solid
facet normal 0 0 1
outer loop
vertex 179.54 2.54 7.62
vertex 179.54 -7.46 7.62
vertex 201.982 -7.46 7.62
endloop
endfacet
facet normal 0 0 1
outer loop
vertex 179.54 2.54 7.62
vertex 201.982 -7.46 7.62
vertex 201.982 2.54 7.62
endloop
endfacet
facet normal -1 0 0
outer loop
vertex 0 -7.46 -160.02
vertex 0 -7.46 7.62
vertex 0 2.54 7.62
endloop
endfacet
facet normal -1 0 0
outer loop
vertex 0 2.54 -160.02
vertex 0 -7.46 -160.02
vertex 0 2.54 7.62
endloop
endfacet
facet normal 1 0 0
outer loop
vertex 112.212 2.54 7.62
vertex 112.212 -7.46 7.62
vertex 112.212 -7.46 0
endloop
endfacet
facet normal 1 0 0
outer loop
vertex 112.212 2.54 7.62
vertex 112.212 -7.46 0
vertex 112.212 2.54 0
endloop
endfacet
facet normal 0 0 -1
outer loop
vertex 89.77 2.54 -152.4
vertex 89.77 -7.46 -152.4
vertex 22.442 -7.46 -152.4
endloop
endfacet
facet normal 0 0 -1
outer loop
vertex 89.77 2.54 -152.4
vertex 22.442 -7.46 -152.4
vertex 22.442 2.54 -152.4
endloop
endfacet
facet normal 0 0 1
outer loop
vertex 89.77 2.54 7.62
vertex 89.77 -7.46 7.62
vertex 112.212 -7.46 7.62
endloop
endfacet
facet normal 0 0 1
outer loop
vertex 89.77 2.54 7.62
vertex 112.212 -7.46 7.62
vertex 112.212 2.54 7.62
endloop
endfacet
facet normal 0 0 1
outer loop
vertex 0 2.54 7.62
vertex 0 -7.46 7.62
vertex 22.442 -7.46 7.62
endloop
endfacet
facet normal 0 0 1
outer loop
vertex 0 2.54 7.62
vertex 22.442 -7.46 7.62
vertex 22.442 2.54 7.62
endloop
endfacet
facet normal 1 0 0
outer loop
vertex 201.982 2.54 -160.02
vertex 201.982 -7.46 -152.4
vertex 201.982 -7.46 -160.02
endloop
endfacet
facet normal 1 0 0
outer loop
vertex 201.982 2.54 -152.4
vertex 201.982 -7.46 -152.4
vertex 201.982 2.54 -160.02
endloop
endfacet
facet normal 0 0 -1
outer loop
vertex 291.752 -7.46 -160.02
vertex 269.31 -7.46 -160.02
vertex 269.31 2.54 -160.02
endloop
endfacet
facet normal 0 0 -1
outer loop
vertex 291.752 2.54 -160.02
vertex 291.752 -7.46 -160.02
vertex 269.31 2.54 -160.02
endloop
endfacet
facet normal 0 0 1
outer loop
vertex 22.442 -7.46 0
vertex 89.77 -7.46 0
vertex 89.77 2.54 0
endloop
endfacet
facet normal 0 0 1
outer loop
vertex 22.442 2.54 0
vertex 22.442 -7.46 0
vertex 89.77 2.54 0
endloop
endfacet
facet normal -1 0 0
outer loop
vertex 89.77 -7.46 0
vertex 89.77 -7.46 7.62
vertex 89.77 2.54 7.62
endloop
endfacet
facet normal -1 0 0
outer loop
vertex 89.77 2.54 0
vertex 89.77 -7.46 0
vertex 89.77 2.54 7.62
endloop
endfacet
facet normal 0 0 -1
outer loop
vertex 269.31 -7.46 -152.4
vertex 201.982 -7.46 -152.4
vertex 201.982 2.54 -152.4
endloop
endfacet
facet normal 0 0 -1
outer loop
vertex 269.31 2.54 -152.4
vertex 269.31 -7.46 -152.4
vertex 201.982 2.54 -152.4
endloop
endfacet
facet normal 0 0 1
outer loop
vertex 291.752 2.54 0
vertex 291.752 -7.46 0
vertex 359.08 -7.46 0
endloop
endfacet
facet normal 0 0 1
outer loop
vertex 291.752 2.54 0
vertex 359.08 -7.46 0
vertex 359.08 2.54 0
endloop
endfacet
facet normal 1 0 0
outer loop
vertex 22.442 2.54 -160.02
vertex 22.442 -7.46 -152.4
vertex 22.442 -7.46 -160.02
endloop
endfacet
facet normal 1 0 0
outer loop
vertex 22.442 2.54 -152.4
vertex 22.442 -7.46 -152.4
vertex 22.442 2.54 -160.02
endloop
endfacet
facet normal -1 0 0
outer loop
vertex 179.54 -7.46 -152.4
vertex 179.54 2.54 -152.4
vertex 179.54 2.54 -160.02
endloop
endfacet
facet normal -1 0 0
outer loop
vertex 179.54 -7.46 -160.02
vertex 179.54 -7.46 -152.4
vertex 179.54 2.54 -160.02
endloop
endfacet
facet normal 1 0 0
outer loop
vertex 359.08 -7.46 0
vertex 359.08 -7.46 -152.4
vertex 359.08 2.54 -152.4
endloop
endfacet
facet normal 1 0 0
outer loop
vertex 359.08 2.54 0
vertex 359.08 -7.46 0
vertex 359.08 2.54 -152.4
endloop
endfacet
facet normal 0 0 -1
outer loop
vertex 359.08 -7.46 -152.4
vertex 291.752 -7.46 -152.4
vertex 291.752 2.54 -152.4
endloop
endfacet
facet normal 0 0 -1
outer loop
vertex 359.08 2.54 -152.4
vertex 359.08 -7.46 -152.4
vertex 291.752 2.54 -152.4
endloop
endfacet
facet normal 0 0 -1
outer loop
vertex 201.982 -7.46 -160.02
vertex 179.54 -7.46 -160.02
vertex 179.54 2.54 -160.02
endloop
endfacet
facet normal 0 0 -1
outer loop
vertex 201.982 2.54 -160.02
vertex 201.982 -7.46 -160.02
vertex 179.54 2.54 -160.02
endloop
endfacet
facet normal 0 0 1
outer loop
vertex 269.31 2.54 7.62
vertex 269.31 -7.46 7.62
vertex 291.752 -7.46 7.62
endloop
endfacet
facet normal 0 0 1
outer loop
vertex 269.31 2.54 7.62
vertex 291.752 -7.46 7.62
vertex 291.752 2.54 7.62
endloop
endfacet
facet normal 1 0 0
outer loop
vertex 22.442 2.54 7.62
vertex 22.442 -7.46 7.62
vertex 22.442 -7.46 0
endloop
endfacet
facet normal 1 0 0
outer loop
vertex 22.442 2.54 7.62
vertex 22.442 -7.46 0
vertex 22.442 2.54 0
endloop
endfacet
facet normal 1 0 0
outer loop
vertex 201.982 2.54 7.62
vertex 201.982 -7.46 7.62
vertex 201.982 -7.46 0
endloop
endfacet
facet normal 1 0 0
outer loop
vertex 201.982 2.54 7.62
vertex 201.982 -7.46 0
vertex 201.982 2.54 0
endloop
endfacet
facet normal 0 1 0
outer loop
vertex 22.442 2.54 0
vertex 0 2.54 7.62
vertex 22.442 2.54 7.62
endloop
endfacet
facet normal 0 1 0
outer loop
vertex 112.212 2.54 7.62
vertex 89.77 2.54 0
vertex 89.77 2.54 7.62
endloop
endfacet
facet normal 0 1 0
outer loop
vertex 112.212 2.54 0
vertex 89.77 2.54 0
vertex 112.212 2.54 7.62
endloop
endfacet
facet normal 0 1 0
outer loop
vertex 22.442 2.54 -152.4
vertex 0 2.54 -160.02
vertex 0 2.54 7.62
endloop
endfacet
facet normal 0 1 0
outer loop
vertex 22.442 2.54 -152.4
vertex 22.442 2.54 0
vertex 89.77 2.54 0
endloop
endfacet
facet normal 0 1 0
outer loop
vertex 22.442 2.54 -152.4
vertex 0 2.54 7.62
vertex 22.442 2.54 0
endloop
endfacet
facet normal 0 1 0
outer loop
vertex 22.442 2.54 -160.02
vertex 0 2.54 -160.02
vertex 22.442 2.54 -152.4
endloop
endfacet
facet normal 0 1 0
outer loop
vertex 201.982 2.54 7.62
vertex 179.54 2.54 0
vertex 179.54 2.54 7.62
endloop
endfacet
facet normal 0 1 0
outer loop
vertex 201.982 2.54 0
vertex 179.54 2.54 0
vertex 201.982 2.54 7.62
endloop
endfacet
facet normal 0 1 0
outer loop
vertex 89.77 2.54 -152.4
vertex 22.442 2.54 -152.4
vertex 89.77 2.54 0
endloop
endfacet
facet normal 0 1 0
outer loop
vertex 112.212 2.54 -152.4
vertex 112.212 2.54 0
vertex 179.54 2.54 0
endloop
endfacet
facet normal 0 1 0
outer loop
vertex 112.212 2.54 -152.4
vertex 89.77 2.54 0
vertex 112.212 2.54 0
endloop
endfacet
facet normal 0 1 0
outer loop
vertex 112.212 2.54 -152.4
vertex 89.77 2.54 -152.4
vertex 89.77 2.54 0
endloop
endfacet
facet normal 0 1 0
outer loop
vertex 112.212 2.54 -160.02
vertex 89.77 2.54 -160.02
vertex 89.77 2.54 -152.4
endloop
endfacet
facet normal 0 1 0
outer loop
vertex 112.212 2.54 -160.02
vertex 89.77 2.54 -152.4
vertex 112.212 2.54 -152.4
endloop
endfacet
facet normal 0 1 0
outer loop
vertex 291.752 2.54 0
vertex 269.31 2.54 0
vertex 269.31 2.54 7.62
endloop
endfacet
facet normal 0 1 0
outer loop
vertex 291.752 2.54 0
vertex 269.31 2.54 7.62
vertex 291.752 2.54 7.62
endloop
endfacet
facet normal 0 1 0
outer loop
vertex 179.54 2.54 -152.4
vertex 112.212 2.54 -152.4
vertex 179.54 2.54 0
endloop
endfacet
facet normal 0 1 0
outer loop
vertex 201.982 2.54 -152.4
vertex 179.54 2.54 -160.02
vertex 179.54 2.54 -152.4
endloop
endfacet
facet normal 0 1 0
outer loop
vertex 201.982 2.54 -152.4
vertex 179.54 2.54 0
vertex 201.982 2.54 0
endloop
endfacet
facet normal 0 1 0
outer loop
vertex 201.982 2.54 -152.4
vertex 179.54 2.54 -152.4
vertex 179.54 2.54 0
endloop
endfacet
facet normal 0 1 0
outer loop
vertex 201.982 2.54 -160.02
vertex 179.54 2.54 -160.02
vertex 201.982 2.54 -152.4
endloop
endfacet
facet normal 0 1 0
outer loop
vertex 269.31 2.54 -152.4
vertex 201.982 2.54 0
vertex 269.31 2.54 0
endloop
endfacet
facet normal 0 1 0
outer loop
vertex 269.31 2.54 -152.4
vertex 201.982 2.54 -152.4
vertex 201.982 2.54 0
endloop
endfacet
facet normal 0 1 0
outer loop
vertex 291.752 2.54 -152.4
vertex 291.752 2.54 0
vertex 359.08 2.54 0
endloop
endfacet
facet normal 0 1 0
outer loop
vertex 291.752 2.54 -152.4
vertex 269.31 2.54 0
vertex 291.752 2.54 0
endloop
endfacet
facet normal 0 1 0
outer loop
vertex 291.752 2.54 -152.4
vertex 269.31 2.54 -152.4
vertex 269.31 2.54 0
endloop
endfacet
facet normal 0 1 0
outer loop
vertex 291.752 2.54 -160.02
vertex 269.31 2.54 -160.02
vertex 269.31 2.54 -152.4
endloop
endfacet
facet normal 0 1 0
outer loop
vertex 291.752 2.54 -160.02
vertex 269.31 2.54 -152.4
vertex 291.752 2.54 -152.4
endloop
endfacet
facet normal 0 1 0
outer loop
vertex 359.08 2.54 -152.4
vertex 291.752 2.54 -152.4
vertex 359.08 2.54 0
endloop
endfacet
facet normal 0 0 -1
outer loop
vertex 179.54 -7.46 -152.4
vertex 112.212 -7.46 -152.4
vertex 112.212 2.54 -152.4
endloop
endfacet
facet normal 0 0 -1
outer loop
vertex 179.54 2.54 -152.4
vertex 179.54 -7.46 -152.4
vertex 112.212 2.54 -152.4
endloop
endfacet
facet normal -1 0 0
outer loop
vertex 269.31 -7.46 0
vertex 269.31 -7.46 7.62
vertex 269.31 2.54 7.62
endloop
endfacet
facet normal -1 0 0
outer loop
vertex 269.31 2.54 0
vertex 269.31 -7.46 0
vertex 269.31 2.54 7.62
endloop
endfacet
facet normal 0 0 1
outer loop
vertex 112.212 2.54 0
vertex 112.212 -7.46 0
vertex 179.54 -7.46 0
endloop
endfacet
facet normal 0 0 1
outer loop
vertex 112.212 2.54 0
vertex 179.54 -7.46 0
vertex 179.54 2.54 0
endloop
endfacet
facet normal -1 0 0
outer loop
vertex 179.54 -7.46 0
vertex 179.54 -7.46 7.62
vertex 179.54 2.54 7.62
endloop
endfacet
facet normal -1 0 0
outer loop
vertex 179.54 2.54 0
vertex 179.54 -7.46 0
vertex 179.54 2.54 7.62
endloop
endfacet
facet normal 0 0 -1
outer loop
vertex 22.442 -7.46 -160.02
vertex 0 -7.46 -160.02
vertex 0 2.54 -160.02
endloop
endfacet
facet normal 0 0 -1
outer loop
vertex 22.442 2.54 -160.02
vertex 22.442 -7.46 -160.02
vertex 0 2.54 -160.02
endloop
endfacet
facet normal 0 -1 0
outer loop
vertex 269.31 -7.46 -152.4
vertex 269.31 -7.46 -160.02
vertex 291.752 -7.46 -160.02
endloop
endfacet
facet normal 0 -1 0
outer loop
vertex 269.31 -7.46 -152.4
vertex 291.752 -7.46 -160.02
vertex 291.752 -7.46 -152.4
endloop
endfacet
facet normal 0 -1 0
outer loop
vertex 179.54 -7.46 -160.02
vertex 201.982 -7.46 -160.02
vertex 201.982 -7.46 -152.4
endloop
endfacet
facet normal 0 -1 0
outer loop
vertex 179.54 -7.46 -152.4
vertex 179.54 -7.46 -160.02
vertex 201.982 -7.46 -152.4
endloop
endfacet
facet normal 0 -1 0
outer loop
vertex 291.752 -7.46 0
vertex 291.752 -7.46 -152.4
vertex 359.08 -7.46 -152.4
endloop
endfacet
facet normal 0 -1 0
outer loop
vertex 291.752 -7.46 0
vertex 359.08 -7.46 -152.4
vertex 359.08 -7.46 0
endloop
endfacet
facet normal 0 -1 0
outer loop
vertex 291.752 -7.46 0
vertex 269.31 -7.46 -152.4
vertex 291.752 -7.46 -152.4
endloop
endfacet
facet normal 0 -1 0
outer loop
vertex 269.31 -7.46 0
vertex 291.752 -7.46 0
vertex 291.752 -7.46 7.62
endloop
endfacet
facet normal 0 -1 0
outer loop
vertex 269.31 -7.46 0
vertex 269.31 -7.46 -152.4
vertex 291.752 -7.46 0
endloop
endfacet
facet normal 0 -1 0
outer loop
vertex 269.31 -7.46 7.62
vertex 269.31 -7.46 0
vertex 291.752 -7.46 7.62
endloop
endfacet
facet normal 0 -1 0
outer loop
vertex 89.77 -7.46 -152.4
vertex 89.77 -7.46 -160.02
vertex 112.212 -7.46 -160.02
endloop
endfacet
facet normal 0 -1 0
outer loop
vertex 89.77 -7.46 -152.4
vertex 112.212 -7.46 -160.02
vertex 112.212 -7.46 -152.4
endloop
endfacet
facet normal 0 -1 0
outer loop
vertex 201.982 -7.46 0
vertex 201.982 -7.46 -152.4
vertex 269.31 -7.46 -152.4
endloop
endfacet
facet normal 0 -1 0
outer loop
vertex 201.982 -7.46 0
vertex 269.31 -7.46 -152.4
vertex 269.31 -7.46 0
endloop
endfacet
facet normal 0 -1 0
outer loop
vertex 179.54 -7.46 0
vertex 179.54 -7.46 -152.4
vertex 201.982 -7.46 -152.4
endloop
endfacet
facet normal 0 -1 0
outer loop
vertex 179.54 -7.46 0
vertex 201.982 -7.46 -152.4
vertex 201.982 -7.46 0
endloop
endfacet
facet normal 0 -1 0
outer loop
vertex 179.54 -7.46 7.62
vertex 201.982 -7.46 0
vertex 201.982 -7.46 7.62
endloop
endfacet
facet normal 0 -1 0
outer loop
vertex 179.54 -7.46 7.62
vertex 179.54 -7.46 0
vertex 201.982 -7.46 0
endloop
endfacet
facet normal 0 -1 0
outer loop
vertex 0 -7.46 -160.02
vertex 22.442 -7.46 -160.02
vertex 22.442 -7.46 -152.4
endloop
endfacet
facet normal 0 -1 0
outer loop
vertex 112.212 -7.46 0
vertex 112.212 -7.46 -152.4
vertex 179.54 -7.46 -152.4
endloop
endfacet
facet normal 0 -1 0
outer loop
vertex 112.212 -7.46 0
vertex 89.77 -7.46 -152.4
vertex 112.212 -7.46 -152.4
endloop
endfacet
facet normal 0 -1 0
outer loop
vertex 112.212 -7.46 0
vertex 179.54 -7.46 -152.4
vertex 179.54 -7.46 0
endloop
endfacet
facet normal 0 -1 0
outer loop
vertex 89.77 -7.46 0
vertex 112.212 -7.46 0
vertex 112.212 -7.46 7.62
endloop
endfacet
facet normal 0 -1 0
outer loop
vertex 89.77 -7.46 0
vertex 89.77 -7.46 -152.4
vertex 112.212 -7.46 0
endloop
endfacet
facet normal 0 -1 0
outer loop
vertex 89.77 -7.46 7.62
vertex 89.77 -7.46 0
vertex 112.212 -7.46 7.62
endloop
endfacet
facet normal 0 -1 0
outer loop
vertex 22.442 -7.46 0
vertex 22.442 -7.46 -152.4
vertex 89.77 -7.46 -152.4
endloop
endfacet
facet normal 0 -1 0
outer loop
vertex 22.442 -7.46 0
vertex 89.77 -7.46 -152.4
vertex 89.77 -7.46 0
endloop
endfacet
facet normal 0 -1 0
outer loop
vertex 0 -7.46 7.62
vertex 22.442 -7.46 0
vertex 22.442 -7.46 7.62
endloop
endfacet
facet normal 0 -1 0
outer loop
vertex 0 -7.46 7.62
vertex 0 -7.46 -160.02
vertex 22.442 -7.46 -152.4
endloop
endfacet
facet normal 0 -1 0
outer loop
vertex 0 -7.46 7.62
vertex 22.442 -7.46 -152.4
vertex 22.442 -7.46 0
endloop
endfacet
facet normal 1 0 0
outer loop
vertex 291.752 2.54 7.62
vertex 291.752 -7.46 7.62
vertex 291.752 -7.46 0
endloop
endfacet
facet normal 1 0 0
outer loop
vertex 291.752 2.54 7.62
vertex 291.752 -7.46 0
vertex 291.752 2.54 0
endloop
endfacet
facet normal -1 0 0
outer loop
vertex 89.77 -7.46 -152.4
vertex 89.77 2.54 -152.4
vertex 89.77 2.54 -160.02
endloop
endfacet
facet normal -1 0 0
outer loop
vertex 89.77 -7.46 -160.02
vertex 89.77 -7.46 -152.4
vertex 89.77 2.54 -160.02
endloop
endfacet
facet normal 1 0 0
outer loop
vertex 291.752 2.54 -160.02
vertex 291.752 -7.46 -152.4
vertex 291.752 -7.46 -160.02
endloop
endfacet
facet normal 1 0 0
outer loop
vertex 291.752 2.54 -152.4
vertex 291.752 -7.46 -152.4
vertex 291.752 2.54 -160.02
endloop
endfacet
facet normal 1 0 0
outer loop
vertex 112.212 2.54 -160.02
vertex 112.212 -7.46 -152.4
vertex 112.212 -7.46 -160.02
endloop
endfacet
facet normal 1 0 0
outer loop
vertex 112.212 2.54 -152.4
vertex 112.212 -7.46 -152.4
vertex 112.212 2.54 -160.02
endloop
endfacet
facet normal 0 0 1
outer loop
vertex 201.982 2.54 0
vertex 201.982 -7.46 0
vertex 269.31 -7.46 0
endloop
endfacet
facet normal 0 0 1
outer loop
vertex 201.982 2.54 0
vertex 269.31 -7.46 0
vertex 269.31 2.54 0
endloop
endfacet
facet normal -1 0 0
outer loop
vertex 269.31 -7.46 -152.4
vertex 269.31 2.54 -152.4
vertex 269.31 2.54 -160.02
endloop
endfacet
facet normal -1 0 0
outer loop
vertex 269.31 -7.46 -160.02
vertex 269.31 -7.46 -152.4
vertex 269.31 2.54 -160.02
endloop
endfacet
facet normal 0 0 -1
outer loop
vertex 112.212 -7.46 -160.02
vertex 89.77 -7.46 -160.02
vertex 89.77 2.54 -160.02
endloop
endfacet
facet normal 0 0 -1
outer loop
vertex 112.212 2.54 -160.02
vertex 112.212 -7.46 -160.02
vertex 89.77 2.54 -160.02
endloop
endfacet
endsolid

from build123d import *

# Parameters (mm, degrees)
SKETCH1_W                  = 359.0798
SKETCH1_H                  = 152.4
BOSS_EXTRUDE1_DEPTH        = 2.54
SKETCH2_W                  = 22.4424875
SKETCH2_H                  = 7.62
BOSS_EXTRUDE2_DEPTH        = 2.54
CONVERT_SOLID1_OUTLINE_W   = 7.46
CONVERT_SOLID1_OUTLINE_H   = 152.4
CONVERT_SOLID1_DEPTH       = 359.0798
CONVERT_SOLID1_2_OUTLINE_W = 7.46
CONVERT_SOLID1_2_OUTLINE_H = 7.62
CONVERT_SOLID1_2_DEPTH     = 22.4424875
CONVERT_SOLID1_START       = 89.76995
CONVERT_SOLID1_3_OUTLINE_W = 7.46
CONVERT_SOLID1_3_OUTLINE_H = 7.62
CONVERT_SOLID1_3_DEPTH     = 22.4424875
CONVERT_SOLID1_START_2     = 179.5399
CONVERT_SOLID1_4_OUTLINE_W = 7.46
CONVERT_SOLID1_4_OUTLINE_H = 7.62
CONVERT_SOLID1_4_DEPTH     = 22.4424875
CONVERT_SOLID1_START_3     = 269.30985
CONVERT_SOLID1_5_OUTLINE_W = 7.46
CONVERT_SOLID1_5_OUTLINE_H = 7.62
CONVERT_SOLID1_5_DEPTH     = 22.4424875


# Read off the part's stored shape, not the designer's step: Convert-Solid1
with BuildPart() as part:
    # Sketch1 → Boss-Extrude1 (new body)
    with BuildSketch(Plane(origin=(0, 0, 0), x_dir=(1, 0, 0), z_dir=(0, 1, 0))):
        with Locations((179.5399, 76.2)):
            Rectangle(SKETCH1_W, SKETCH1_H)
    extrude(amount=BOSS_EXTRUDE1_DEPTH)

    # Sketch2 → Boss-Extrude2 (add)
    with BuildSketch(Plane(origin=(0, 2.54, 0), x_dir=(1, 0, 0), z_dir=(0, 1, 0))):
        with Locations((11.22124375, 156.21)):
            Rectangle(SKETCH2_W, SKETCH2_H)
        with Locations((100.99119375, 156.21)):
            Rectangle(SKETCH2_W, SKETCH2_H)
        with Locations((190.76114375, 156.21)):
            Rectangle(SKETCH2_W, SKETCH2_H)
        with Locations((280.53109375, 156.21)):
            Rectangle(SKETCH2_W, SKETCH2_H)
        with Locations((11.22124375, -3.81)):
            Rectangle(SKETCH2_W, SKETCH2_H)
        with Locations((100.99119375, -3.81)):
            Rectangle(SKETCH2_W, SKETCH2_H)
        with Locations((190.76114375, -3.81)):
            Rectangle(SKETCH2_W, SKETCH2_H)
        with Locations((280.53109375, -3.81)):
            Rectangle(SKETCH2_W, SKETCH2_H)
    extrude(amount=-BOSS_EXTRUDE2_DEPTH)

    # Convert-Solid1 outline → Convert-Solid1 (add)
    with BuildSketch(Plane.YZ):
        with Locations((-3.73, -76.2)):
            Rectangle(CONVERT_SOLID1_OUTLINE_W, CONVERT_SOLID1_OUTLINE_H)
    extrude(amount=CONVERT_SOLID1_DEPTH)

    # Convert-Solid1 2 outline → Convert-Solid1 2 (add)
    with BuildSketch(Plane.YZ):
        with Locations((-3.73, 3.81)):
            Rectangle(CONVERT_SOLID1_2_OUTLINE_W, CONVERT_SOLID1_2_OUTLINE_H)
        with Locations((-3.73, -156.21)):
            Rectangle(CONVERT_SOLID1_2_OUTLINE_W, CONVERT_SOLID1_2_OUTLINE_H)
    extrude(amount=CONVERT_SOLID1_2_DEPTH)

    # Convert-Solid1 3 outline → Convert-Solid1 3 (add)
    with BuildSketch(Plane.YZ.offset(CONVERT_SOLID1_START)):
        with Locations((-3.73, 3.81)):
            Rectangle(CONVERT_SOLID1_3_OUTLINE_W, CONVERT_SOLID1_3_OUTLINE_H)
        with Locations((-3.73, -156.21)):
            Rectangle(CONVERT_SOLID1_3_OUTLINE_W, CONVERT_SOLID1_3_OUTLINE_H)
    extrude(amount=CONVERT_SOLID1_3_DEPTH)

    # Convert-Solid1 4 outline → Convert-Solid1 4 (add)
    with BuildSketch(Plane.YZ.offset(CONVERT_SOLID1_START_2)):
        with Locations((-3.73, 3.81)):
            Rectangle(CONVERT_SOLID1_4_OUTLINE_W, CONVERT_SOLID1_4_OUTLINE_H)
        with Locations((-3.73, -156.21)):
            Rectangle(CONVERT_SOLID1_4_OUTLINE_W, CONVERT_SOLID1_4_OUTLINE_H)
    extrude(amount=CONVERT_SOLID1_4_DEPTH)

    # Convert-Solid1 5 outline → Convert-Solid1 5 (add)
    with BuildSketch(Plane.YZ.offset(CONVERT_SOLID1_START_3)):
        with Locations((-3.73, 3.81)):
            Rectangle(CONVERT_SOLID1_5_OUTLINE_W, CONVERT_SOLID1_5_OUTLINE_H)
        with Locations((-3.73, -156.21)):
            Rectangle(CONVERT_SOLID1_5_OUTLINE_W, CONVERT_SOLID1_5_OUTLINE_H)
    extrude(amount=CONVERT_SOLID1_5_DEPTH)


solid = part.part
